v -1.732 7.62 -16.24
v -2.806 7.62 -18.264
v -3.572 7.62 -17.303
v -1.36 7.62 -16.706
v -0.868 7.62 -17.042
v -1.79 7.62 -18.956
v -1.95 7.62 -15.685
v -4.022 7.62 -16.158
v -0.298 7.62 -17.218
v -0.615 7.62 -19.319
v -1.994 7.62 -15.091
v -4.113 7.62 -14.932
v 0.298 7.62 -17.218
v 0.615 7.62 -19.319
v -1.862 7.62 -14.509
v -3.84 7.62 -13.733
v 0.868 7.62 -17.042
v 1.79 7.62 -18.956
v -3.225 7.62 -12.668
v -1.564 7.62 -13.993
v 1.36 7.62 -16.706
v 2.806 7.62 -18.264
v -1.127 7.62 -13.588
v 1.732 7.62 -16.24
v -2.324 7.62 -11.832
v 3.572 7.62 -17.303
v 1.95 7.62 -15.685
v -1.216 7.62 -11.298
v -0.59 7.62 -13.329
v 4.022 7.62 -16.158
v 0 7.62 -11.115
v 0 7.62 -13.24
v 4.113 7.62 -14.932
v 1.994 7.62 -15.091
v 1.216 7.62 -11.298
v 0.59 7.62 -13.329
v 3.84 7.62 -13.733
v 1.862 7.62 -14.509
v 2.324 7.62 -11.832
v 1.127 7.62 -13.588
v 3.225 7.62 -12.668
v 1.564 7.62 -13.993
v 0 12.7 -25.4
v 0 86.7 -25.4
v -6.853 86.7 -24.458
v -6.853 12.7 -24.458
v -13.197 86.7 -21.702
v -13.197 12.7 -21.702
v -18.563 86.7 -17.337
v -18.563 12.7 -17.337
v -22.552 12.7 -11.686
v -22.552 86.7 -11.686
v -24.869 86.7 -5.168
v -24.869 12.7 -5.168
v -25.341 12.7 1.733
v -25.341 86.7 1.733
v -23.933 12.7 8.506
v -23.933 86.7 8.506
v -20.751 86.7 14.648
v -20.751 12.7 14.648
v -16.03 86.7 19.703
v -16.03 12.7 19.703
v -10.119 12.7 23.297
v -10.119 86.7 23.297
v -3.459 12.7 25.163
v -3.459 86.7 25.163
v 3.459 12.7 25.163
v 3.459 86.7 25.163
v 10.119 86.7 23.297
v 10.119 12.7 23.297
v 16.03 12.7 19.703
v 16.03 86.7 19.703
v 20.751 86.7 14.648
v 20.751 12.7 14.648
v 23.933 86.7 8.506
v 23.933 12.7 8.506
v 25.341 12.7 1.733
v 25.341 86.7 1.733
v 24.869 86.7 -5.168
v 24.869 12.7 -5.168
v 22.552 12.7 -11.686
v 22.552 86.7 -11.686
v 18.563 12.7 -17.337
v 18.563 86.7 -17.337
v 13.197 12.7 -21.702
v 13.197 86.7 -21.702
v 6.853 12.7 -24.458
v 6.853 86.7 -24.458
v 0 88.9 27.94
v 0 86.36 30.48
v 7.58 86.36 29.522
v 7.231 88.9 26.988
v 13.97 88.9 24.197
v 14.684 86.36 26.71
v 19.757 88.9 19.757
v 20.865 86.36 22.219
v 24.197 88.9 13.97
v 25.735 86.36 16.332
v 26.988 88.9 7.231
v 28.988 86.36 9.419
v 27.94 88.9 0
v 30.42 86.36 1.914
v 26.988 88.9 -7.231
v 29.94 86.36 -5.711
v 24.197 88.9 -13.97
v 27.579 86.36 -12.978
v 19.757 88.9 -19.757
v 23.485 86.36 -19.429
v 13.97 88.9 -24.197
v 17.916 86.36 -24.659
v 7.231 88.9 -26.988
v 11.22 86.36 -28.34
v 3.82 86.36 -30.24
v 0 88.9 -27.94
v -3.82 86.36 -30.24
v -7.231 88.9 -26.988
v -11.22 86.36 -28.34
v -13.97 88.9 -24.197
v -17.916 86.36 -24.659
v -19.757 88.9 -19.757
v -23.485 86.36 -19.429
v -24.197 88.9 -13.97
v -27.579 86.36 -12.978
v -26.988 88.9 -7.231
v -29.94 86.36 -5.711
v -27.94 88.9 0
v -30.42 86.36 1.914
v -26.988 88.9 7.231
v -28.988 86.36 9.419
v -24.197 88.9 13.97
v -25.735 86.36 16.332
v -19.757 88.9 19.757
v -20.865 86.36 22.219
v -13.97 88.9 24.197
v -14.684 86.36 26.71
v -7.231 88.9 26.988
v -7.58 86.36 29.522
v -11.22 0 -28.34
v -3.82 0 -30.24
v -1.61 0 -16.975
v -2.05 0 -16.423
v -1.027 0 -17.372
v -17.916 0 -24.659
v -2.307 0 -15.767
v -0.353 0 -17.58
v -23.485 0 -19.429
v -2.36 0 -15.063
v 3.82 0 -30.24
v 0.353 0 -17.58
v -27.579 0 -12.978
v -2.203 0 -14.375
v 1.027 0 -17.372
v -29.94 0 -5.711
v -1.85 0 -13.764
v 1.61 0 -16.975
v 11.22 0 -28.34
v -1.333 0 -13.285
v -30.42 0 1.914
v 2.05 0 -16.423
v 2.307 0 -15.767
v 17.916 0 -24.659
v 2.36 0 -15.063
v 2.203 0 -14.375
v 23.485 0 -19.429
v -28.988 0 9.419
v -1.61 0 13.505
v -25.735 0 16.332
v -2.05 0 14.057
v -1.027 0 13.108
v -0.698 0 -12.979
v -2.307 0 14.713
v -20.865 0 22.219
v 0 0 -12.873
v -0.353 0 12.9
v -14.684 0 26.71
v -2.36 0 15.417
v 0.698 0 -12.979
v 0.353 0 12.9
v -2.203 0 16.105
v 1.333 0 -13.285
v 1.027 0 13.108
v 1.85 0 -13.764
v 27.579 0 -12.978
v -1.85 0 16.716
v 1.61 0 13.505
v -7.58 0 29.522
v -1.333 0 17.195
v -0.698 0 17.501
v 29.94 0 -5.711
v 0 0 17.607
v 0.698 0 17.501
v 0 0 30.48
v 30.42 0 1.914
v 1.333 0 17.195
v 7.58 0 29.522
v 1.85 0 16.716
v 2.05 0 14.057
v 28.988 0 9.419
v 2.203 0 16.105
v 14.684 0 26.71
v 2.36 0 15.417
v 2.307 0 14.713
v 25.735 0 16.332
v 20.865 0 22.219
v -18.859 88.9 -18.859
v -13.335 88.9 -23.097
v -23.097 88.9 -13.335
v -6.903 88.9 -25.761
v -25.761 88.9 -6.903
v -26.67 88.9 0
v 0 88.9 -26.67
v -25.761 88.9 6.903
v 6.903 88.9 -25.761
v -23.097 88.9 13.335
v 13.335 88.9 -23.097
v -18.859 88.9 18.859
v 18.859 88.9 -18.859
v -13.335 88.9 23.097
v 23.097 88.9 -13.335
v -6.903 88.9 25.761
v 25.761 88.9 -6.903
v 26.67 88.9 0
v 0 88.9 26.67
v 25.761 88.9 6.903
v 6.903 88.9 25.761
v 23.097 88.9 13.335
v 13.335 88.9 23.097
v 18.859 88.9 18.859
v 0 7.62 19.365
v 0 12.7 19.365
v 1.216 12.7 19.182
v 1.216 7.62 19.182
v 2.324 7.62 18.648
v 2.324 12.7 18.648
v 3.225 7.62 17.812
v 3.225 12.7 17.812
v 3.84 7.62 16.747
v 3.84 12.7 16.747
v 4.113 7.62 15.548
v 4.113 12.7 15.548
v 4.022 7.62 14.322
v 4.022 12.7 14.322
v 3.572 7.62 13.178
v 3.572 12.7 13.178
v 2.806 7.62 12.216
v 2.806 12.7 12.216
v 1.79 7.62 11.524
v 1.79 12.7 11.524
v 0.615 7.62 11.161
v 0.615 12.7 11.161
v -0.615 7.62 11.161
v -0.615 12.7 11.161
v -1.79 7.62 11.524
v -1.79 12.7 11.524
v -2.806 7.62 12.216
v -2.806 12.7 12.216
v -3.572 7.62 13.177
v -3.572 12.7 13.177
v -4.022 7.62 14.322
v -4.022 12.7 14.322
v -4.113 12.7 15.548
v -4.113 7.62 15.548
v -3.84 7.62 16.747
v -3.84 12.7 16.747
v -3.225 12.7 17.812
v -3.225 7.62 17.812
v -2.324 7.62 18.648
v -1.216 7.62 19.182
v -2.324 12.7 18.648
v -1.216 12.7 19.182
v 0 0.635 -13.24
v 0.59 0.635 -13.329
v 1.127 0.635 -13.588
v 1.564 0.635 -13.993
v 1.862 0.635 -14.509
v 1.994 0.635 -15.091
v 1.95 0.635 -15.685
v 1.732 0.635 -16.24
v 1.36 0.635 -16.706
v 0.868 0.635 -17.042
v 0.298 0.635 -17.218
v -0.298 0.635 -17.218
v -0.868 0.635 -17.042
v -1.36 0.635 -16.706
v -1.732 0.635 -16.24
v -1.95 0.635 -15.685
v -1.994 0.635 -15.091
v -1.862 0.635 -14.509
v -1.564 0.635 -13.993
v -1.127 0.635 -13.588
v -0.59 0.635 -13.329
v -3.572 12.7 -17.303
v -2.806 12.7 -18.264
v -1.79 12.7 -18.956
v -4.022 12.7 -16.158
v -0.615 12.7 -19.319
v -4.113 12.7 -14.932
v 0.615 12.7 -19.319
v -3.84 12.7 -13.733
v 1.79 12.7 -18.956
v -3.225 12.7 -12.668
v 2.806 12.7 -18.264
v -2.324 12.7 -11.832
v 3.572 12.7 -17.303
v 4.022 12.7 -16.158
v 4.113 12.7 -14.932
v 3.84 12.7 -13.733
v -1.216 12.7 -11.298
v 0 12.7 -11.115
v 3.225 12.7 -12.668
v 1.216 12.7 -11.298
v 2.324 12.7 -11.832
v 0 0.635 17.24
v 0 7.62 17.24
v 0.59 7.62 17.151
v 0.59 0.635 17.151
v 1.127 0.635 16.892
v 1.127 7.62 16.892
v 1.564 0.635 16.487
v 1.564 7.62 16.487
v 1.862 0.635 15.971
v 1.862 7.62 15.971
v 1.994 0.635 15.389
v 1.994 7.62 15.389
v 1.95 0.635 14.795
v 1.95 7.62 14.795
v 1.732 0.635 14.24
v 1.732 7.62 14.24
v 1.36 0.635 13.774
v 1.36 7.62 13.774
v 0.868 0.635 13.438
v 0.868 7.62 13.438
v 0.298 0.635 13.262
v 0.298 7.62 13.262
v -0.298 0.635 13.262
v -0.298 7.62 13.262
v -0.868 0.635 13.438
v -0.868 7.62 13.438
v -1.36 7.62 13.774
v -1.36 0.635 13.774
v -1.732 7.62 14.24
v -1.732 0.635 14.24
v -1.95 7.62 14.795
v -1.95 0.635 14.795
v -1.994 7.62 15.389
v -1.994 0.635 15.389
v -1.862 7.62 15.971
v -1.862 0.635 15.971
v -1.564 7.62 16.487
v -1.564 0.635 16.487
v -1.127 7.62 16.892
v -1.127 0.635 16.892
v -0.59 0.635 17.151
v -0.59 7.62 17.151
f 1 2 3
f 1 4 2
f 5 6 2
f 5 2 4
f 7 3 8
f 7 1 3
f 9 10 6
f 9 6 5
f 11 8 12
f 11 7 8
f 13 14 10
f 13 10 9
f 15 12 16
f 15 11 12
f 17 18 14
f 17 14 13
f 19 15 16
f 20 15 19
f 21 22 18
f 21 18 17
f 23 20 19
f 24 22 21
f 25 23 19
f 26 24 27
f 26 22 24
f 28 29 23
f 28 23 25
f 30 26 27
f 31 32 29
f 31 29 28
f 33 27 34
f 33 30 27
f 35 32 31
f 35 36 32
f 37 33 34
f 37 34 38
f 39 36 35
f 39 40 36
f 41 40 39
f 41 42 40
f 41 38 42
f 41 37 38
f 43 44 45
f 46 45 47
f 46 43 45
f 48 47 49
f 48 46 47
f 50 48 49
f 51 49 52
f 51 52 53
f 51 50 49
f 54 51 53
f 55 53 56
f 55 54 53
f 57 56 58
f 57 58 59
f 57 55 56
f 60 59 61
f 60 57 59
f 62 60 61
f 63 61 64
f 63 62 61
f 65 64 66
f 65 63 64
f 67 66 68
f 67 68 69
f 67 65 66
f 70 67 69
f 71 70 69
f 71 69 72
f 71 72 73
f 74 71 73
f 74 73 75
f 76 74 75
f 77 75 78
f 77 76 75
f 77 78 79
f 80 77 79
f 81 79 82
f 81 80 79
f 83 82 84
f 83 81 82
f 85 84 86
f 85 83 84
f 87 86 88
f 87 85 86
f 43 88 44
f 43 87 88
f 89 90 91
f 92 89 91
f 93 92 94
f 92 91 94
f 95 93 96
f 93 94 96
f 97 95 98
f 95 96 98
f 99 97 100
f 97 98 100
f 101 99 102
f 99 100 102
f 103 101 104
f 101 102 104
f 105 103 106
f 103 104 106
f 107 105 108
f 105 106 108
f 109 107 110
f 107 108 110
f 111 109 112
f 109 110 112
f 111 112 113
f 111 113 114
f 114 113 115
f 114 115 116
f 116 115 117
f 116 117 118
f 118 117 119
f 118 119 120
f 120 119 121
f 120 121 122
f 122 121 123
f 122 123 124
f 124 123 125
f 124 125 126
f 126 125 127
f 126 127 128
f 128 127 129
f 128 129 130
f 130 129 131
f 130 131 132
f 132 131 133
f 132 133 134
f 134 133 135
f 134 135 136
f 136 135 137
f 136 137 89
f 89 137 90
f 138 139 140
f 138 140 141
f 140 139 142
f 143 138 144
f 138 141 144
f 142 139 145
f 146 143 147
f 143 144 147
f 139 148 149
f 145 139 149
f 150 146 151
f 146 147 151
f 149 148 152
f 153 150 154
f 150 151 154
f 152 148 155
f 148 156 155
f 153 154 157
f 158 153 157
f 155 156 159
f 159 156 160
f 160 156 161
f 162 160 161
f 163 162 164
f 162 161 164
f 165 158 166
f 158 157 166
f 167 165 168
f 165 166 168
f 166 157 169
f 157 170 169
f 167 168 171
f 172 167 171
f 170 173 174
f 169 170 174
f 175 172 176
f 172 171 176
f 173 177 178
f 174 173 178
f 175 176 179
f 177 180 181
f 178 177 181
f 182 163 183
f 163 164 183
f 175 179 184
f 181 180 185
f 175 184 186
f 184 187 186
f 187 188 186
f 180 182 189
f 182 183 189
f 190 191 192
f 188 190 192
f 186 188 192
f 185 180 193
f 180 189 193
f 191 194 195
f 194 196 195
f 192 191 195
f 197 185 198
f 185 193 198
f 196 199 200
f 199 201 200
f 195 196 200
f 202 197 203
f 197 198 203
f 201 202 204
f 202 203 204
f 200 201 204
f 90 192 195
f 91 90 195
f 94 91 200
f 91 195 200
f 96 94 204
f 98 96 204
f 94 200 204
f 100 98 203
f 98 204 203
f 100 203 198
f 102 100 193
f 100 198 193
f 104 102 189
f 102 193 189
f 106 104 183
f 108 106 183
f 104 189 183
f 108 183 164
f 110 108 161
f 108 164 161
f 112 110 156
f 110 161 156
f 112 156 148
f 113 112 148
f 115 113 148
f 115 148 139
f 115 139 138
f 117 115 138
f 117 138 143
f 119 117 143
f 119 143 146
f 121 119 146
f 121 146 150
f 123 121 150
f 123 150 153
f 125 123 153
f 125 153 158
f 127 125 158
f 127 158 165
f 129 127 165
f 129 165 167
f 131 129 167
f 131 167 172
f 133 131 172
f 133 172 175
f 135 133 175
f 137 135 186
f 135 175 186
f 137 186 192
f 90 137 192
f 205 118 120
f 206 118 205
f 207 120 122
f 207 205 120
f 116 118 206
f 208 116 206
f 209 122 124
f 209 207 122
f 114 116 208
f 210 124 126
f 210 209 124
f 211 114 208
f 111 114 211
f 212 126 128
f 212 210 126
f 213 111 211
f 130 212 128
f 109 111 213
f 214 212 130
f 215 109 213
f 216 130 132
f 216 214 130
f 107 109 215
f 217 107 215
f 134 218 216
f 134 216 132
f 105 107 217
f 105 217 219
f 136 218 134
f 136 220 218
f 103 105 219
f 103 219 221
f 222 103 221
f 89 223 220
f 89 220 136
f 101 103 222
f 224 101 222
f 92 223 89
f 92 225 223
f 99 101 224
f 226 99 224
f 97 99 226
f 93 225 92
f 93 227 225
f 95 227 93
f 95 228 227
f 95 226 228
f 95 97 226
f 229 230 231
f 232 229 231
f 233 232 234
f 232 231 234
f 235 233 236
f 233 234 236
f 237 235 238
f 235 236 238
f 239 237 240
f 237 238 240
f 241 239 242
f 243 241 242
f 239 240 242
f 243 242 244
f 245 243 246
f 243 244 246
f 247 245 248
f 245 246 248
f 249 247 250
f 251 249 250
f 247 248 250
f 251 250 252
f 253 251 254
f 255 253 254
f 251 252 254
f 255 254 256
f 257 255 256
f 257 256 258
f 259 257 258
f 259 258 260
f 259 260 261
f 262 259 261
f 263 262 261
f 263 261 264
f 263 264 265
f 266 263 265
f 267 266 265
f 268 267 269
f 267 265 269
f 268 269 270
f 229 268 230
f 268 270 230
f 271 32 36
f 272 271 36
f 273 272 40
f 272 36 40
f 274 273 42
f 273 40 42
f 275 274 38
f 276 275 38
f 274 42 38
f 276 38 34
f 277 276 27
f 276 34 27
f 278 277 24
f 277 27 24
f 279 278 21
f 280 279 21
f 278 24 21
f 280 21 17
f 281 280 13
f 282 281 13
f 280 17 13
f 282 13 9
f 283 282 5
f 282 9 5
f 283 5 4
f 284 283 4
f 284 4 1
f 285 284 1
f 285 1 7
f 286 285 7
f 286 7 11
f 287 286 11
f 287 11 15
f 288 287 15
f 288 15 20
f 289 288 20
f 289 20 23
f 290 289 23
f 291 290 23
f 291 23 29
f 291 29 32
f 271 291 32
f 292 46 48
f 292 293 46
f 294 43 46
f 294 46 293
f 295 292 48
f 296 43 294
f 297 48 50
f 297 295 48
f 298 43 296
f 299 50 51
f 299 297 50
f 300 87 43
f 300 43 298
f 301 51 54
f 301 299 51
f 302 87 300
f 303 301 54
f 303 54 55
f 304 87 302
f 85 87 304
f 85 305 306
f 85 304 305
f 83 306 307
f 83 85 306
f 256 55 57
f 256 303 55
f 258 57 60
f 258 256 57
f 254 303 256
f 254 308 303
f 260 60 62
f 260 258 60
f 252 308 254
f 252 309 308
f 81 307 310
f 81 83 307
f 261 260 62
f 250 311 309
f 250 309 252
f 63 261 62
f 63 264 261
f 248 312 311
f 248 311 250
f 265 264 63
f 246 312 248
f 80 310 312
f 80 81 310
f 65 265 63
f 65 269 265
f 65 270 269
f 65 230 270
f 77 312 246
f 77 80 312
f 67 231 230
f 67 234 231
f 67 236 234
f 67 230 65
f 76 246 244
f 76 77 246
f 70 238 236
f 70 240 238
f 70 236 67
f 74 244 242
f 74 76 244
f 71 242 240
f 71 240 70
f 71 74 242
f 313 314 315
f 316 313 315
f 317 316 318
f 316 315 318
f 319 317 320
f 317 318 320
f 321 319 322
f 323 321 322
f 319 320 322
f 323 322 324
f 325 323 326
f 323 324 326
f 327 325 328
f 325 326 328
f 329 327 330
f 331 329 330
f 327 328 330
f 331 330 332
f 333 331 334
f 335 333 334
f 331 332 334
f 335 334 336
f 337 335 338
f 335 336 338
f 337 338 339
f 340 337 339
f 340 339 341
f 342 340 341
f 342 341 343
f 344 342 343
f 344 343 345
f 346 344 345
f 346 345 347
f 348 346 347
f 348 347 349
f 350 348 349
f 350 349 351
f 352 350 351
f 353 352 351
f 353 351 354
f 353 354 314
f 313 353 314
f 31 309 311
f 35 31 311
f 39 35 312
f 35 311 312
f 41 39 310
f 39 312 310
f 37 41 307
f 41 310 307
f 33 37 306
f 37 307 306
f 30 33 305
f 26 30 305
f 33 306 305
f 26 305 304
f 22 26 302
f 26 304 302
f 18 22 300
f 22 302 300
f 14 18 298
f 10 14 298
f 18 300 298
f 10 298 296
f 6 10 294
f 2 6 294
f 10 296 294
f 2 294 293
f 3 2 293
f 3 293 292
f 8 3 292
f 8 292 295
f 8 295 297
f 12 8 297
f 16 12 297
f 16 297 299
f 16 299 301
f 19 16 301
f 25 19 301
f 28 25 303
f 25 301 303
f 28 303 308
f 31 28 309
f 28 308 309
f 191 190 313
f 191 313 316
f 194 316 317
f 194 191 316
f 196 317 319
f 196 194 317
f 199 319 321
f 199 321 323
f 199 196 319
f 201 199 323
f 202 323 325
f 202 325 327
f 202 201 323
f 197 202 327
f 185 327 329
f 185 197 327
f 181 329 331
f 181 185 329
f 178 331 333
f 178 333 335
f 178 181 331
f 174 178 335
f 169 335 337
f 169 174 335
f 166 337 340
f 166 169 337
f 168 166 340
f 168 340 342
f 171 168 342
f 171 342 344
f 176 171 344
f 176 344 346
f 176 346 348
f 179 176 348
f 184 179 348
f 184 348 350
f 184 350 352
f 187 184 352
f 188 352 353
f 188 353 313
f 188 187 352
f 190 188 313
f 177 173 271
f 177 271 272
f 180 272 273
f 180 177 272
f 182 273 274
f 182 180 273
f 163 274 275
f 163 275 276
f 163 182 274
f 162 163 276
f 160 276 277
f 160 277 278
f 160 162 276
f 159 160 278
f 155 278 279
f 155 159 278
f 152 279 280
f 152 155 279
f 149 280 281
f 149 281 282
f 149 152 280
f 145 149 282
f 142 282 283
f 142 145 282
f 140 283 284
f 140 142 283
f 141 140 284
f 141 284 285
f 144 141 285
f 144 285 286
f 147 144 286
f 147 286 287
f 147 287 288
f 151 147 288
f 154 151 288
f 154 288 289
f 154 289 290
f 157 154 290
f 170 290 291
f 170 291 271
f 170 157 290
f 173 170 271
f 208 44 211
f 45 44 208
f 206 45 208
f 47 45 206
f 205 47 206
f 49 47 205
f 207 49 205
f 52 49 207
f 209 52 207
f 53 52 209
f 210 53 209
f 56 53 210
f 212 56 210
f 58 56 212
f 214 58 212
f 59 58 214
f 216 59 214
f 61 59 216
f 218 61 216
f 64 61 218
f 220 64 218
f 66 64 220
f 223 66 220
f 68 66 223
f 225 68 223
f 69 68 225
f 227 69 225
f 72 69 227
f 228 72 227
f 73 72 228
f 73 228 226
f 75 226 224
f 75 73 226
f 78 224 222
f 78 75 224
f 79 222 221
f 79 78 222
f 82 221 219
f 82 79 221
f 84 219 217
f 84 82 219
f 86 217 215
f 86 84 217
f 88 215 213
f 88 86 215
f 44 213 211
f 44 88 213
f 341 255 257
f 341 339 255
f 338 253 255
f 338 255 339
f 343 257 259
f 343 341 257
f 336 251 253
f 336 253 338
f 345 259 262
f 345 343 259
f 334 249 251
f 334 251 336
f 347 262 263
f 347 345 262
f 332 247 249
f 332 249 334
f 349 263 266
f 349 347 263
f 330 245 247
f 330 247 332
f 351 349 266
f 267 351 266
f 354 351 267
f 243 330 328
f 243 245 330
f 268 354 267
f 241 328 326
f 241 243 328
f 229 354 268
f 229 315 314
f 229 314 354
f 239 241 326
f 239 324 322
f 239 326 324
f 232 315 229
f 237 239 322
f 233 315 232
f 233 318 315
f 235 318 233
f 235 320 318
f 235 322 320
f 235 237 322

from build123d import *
from OCP.BRepFilletAPI import BRepFilletAPI_MakeChamfer

# Parameters (mm, degrees)
SKETCH2_R           = 30.48
BOSS_EXTRUDE2_DEPTH = 12.7
SKETCH3_R           = 4.125
CUT_EXTRUDE1_DEPTH  = 5.08
SKETCH4_R           = 2
CUT_EXTRUDE2_DEPTH  = 44.773567367
SKETCH5_R           = 30.48
SKETCH5_R_2         = 25.4
BOSS_EXTRUDE3_DEPTH = 76.2
CHAMFER1_SIZE       = 1.27
CHAMFER1_SIZE2      = 2.199704526
CHAMFER2_SIZE       = 2.54
CHAMFER3_SIZE       = 0.635
CHAMFER3_SIZE2      = 0.366617421


with BuildPart() as part:
    # Sketch2 → Boss-Extrude2 (new body)
    with BuildSketch(Plane(origin=(0, 0, 0), x_dir=(1, 0, 0), z_dir=(0, 1, 0))):
        with Locations(Location((0, 0, 0), (0, 0, 270))):
            Circle(SKETCH2_R)
    extrude(amount=BOSS_EXTRUDE2_DEPTH)

    # Sketch3 → Cut-Extrude1 (cut)
    with BuildSketch(Plane(origin=(0, 12.7, 0), x_dir=(1, 0, 0), z_dir=(0, 1, 0))):
        with Locations(Location((0, 15.24, 0), (0, 0, 270))):
            Circle(SKETCH3_R)
        with Locations(Location((0, -15.24, 0), (0, 0, 270))):
            Circle(SKETCH3_R)
    extrude(amount=-CUT_EXTRUDE1_DEPTH, mode=Mode.SUBTRACT)

    # Sketch4 → Cut-Extrude2 (cut, through all)
    with BuildSketch(Plane(origin=(0, 7.62, 0), x_dir=(1, 0, 0), z_dir=(0, 1, 0))):
        with Locations(Location((0, 15.24, 0), (0, 0, 270))):
            Circle(SKETCH4_R)
        with Locations(Location((0, -15.24, 0), (0, 0, 270))):
            Circle(SKETCH4_R)
    extrude(amount=-CUT_EXTRUDE2_DEPTH, mode=Mode.SUBTRACT)

    # Sketch5 → Boss-Extrude3 (add)
    with BuildSketch(Plane(origin=(0, 12.7, 0), x_dir=(1, 0, 0), z_dir=(0, 1, 0))):
        with Locations(Location((0, 0, 0), (0, 0, 270))):
            Circle(SKETCH5_R)
        with Locations(Location((0, 0, 0), (0, 0, 90))):
            Circle(SKETCH5_R_2, mode=Mode.SUBTRACT)
    extrude(amount=BOSS_EXTRUDE3_DEPTH)

    # Chamfer1
    chamfer1_edges = [part.edges().sort_by_distance(p)[0] for p in [
        (0, 88.9, 25.4),
    ]]
    chamfer1_side = [part.faces().sort_by_distance(p)[0] for p in [
        (0, 88.9, -29.617895412),
    ]]
    chamfer(chamfer1_edges, length=CHAMFER1_SIZE, length2=CHAMFER1_SIZE2, reference=chamfer1_side[0])

    # Chamfer2
    chamfer2_edges = [part.edges().sort_by_distance(p)[0] for p in [
        (0, 88.9, -30.48),
    ]]
    chamfer(chamfer2_edges, length=CHAMFER2_SIZE)

    # Chamfer3: one chamfer whose edges measure the first distance from different faces: ONE call of the kernel's chamfer builder (chamfer() names one face for all edges)
    chamfer3_edges_1 = [part.edges().sort_by_distance(p)[0] for p in [
        (0, 0, -17.24),
    ]]
    chamfer3_side_1 = [part.faces().sort_by_distance(p)[0] for p in [
        (0, 3.81, -17.24),
    ]]
    chamfer3_edges_2 = [part.edges().sort_by_distance(p)[0] for p in [
        (0, 0, 13.24),
    ]]
    chamfer3_side_2 = [part.faces().sort_by_distance(p)[0] for p in [
        (0, 3.81, 13.24),
    ]]
    chamfer3 = BRepFilletAPI_MakeChamfer(part.part.solid().wrapped)
    for e in chamfer3_edges_1:
        chamfer3.Add(CHAMFER3_SIZE, CHAMFER3_SIZE2, e.wrapped, chamfer3_side_1[0].wrapped)  # the first distance lies on this face
    for e in chamfer3_edges_2:
        chamfer3.Add(CHAMFER3_SIZE, CHAMFER3_SIZE2, e.wrapped, chamfer3_side_2[0].wrapped)  # the first distance lies on this face
    add(Compound.cast(chamfer3.Shape()), mode=Mode.REPLACE)


solid = part.part
